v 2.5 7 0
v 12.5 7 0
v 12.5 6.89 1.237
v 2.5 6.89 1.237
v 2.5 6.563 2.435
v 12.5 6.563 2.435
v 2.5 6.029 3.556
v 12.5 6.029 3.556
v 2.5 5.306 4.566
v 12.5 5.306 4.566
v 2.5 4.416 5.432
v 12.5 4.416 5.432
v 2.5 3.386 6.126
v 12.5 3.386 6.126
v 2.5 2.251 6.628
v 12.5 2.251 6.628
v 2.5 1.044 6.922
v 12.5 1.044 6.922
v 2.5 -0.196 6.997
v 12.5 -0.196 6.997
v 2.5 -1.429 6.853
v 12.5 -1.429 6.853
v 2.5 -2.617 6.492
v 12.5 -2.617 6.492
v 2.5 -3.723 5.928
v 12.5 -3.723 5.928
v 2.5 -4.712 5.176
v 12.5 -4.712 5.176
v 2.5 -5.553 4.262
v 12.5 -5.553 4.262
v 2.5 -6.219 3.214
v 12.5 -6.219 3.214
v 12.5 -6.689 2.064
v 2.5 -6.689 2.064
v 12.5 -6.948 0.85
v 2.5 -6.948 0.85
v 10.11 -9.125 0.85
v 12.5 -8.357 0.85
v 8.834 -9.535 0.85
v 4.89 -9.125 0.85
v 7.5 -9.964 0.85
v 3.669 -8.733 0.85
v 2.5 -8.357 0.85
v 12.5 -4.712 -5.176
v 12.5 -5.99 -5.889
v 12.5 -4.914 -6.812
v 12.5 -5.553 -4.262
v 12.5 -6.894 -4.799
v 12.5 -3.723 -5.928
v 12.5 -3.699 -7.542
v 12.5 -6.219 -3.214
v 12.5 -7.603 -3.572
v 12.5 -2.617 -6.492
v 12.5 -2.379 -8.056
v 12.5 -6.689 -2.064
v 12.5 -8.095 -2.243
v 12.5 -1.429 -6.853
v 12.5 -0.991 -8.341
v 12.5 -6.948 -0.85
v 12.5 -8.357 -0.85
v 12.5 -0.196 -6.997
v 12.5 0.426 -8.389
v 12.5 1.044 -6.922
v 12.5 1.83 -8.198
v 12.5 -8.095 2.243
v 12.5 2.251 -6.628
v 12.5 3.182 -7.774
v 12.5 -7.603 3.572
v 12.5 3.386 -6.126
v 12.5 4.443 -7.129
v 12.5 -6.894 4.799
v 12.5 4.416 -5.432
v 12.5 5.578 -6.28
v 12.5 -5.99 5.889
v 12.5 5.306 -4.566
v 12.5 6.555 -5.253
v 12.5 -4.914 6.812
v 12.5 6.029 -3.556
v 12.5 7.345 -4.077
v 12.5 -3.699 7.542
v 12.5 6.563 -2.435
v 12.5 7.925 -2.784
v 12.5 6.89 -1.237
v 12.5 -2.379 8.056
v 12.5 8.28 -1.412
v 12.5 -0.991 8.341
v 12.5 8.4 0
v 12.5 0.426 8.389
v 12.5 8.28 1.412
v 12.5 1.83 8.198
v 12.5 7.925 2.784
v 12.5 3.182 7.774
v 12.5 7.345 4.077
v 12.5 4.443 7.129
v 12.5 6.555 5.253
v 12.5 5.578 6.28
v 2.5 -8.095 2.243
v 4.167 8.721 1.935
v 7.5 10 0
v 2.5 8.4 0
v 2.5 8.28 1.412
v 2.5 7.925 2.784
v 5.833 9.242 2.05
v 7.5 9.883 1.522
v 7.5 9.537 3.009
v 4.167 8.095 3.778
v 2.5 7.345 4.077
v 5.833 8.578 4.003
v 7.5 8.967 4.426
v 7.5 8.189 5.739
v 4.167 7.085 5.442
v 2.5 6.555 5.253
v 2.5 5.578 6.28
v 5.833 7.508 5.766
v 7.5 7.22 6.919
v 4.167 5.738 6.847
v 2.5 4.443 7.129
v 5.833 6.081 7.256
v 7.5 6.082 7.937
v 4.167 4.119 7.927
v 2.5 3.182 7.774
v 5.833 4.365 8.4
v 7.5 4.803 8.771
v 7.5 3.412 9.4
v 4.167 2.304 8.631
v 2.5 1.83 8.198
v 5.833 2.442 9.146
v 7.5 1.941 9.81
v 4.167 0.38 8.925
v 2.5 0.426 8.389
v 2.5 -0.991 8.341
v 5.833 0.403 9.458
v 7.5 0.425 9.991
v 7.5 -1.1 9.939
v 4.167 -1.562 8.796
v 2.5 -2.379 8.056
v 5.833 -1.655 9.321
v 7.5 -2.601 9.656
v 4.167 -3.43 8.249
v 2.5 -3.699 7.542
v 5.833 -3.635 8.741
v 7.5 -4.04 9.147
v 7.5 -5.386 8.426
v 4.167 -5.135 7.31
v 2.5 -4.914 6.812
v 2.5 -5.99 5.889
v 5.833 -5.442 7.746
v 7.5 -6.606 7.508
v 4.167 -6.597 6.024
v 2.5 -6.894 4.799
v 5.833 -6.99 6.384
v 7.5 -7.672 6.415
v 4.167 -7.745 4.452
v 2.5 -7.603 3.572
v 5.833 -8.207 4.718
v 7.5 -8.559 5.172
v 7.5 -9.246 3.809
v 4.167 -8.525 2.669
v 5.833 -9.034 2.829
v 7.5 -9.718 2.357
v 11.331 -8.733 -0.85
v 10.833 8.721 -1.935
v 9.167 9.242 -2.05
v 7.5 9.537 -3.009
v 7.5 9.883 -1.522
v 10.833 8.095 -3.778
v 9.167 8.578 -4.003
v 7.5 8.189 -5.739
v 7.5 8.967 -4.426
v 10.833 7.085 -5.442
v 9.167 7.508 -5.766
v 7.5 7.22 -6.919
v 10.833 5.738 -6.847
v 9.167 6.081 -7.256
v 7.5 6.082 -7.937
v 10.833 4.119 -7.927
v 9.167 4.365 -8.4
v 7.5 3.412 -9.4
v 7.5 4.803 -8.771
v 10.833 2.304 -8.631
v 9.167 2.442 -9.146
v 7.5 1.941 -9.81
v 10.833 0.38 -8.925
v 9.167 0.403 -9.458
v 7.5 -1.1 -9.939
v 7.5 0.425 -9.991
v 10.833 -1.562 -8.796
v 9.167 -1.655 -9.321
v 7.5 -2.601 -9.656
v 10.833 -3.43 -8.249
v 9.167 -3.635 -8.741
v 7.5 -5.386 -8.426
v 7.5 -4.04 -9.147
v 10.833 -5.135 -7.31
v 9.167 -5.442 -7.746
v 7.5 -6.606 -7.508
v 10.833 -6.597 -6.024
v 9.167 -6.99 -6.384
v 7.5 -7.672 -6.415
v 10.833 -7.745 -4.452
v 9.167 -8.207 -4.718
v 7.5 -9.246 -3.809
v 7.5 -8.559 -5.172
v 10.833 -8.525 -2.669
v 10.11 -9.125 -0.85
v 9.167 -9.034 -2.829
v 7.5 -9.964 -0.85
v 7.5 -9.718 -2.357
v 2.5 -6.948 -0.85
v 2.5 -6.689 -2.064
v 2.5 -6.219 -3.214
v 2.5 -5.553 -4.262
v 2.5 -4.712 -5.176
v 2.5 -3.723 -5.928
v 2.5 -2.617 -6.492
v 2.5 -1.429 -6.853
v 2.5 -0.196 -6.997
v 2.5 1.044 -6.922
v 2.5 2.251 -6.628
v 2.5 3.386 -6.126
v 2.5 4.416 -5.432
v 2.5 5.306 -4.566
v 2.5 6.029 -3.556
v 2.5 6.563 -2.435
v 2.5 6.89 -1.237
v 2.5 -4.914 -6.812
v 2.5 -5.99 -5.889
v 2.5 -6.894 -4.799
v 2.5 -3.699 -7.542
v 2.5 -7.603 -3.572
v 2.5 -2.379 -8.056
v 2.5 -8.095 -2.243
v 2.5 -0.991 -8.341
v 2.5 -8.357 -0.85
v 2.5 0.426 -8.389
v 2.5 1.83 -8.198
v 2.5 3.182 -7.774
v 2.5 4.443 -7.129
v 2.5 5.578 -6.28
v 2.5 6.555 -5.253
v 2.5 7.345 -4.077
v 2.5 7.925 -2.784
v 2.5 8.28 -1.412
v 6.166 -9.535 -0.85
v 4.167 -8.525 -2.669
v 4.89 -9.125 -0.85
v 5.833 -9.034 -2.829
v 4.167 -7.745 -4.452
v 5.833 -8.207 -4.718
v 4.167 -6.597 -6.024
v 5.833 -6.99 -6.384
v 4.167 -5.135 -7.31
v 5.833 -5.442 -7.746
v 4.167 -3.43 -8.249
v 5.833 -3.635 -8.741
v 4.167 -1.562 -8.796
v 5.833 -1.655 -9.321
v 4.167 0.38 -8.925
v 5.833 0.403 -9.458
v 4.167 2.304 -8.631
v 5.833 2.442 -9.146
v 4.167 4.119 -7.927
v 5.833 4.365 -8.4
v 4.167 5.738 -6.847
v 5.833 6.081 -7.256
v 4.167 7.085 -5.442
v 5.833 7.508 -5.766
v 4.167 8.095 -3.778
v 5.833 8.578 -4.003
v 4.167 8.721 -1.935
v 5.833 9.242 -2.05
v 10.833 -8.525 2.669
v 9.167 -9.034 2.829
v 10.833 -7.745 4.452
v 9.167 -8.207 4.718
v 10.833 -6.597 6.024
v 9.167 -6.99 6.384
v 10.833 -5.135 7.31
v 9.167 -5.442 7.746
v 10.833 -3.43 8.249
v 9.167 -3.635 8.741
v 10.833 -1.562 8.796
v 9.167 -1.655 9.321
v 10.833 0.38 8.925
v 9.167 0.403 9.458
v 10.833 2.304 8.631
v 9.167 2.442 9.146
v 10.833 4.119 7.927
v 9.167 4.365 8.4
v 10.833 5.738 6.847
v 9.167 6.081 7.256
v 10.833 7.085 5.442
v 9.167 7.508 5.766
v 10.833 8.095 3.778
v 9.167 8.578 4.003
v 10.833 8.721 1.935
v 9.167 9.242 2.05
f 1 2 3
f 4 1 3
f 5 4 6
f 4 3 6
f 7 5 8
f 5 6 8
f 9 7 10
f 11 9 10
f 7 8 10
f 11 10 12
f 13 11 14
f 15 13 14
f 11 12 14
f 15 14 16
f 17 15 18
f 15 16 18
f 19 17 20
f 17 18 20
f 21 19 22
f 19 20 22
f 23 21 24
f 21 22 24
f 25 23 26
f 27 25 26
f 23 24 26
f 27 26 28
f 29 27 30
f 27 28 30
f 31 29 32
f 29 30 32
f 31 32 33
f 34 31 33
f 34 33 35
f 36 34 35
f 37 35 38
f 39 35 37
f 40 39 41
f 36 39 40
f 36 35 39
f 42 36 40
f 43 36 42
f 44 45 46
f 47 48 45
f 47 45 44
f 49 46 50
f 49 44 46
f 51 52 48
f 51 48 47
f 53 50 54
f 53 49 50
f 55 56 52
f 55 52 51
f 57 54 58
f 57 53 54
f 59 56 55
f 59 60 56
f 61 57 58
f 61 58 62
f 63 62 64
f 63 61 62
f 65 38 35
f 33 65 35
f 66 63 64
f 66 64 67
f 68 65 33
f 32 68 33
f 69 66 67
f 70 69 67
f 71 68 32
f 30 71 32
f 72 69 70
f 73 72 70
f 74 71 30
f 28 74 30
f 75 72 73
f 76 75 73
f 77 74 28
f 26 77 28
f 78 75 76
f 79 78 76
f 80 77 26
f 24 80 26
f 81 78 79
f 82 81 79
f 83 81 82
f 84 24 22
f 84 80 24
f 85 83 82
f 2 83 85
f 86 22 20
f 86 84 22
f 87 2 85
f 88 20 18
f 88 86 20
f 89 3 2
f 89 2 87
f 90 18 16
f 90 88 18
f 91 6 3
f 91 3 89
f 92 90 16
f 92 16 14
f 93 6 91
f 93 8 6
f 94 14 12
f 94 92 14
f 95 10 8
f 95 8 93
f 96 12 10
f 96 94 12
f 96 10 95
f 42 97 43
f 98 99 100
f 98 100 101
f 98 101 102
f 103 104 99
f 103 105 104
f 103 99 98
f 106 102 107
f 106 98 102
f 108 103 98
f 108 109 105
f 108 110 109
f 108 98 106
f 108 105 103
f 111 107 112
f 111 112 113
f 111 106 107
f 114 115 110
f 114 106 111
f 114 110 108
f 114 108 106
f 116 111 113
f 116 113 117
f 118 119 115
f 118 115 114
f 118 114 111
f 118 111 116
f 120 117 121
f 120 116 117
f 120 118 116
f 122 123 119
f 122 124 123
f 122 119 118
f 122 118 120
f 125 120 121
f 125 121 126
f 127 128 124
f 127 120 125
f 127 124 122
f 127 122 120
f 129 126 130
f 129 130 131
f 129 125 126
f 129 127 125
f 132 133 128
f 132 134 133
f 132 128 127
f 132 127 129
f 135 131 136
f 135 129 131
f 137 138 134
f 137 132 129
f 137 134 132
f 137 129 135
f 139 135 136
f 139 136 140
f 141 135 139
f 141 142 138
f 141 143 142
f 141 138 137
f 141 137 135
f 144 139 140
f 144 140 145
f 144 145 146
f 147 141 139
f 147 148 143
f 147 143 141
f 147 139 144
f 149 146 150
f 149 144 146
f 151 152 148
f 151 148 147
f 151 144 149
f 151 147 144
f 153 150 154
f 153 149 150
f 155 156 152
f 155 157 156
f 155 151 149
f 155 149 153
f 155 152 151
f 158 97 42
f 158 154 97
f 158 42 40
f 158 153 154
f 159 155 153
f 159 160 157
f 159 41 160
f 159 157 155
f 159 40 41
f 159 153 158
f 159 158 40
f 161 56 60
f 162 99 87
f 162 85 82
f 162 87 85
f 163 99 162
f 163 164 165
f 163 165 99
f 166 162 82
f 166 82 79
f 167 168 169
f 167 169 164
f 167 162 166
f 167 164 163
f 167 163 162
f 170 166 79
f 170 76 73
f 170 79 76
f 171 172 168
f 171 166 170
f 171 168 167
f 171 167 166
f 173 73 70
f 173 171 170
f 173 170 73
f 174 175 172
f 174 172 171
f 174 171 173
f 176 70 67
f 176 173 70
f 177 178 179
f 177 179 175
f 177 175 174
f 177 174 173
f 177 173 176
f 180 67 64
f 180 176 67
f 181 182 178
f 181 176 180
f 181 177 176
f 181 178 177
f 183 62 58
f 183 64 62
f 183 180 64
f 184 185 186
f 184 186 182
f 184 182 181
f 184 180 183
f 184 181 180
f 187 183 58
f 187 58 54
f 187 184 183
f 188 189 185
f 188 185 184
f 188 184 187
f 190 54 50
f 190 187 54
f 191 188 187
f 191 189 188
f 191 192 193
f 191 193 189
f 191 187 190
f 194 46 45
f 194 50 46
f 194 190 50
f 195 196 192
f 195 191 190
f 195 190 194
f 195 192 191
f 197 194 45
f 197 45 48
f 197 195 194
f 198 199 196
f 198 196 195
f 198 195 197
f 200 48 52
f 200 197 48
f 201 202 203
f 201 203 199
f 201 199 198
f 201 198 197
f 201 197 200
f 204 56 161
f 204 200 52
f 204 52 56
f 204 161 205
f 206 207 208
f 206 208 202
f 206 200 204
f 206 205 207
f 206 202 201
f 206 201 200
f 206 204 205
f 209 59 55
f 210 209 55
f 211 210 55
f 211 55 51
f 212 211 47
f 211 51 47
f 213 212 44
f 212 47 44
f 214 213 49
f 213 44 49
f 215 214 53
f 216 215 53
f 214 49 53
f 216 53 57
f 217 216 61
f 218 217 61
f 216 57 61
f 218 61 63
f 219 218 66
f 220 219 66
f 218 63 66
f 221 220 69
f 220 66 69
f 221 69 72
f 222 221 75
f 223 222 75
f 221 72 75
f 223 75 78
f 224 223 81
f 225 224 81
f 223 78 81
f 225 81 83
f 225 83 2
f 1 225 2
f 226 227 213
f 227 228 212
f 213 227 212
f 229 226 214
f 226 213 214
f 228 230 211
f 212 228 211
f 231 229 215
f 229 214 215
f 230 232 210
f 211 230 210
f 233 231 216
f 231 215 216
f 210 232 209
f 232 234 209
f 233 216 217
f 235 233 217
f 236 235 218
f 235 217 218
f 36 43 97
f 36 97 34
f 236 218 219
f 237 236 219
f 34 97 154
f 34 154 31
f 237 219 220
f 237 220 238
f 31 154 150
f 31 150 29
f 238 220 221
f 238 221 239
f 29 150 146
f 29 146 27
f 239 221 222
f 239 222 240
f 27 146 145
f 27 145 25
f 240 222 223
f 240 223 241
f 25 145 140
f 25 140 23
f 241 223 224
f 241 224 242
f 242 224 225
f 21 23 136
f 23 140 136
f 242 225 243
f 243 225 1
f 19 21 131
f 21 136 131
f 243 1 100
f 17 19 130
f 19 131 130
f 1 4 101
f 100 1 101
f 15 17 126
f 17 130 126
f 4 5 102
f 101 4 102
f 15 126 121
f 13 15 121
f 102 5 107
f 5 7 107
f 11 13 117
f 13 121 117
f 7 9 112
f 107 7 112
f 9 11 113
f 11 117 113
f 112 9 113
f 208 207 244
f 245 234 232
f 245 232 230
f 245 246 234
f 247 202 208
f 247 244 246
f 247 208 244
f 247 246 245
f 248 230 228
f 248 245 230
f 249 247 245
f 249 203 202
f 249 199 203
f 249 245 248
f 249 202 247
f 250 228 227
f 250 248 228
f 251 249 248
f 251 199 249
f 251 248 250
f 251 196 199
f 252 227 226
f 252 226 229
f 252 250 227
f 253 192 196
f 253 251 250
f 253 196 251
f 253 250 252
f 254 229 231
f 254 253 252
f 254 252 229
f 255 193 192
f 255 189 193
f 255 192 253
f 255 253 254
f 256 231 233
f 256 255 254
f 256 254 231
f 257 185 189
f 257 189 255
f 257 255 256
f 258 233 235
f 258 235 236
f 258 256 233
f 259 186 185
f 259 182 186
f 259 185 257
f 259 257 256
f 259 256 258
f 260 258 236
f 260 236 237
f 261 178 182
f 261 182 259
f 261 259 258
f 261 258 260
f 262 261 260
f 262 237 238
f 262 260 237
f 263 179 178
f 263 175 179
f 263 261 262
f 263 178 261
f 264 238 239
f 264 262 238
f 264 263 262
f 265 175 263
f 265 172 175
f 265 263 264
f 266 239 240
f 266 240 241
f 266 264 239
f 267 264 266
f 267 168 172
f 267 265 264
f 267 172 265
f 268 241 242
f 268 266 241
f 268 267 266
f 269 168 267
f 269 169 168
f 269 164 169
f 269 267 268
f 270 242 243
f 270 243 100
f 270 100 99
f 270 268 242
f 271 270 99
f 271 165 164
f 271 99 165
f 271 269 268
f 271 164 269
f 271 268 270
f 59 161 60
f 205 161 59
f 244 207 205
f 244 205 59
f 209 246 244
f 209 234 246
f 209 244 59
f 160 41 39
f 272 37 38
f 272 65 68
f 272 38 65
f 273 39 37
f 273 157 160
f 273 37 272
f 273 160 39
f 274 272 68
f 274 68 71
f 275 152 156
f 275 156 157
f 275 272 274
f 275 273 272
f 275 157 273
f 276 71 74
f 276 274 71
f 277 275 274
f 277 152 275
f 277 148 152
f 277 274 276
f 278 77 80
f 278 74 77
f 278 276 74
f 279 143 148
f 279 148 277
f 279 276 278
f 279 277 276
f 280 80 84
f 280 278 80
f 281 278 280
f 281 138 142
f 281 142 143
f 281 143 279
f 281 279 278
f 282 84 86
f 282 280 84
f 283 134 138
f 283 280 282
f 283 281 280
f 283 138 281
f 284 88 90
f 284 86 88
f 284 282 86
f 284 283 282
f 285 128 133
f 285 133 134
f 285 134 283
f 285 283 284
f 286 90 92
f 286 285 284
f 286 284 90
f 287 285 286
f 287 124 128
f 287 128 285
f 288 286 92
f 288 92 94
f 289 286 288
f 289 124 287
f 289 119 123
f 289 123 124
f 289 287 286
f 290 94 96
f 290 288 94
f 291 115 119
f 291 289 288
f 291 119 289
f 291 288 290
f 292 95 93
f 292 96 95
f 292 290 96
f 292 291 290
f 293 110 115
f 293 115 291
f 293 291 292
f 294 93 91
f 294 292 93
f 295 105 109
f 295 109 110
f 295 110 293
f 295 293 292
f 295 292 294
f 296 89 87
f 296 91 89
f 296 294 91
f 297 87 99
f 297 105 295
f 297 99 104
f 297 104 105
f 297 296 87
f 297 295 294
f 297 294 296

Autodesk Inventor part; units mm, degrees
sketch "Sketch_5" plane through (0, 0, 0) normal (0, 0, 1) x (1, 0, 0)
  line L0 (500, 0) -> (-500, 0)
  line L1 (2.5, 8.4) -> (2.5, 7)
  line L2 (2.5, 7) -> (12.5, 7)
  line L3 (12.5, 7) -> (12.5, 8.4)
  line L4 (12.5, 8.4) -> (7.5, 10)
  line L5 (7.5, 10) -> (2.5, 8.4)
revolve "Revolution1" add sketch "Sketch_5" angle 360 about axis through (500, 0, 0) along (1, 0, 0)
sketch "Sketch_6" plane through (7.5, 0, 0) normal (1, 0, 0) x (0, 0, -1)
  line L0 (-0.85, -10) -> (0.85, -10)
  line L1 (0.85, -10) -> (0.85, -6.5)
  line L2 (0.85, -6.5) -> (-0.85, -6.5)
  line L3 (-0.85, -6.5) -> (-0.85, -10)
extrude "Extrusion1" cut sketch "Sketch_6" along normal mid plane 15
ref_plane "it_schrschei_st_XY" through (7.5, 0, 0) normal (1, 0, 0) x (0, 0, -1)
ref_plane "it_schrschei_st_YZ" through (7.5, 0, 0) normal (0, 0, -1) x (0, 1, 0)
ref_plane "it_schrschei_st_ZX" through (7.5, 0, 0) normal (0, 1, 0) x (1, 0, 0)
properties part number "61581400_3"
